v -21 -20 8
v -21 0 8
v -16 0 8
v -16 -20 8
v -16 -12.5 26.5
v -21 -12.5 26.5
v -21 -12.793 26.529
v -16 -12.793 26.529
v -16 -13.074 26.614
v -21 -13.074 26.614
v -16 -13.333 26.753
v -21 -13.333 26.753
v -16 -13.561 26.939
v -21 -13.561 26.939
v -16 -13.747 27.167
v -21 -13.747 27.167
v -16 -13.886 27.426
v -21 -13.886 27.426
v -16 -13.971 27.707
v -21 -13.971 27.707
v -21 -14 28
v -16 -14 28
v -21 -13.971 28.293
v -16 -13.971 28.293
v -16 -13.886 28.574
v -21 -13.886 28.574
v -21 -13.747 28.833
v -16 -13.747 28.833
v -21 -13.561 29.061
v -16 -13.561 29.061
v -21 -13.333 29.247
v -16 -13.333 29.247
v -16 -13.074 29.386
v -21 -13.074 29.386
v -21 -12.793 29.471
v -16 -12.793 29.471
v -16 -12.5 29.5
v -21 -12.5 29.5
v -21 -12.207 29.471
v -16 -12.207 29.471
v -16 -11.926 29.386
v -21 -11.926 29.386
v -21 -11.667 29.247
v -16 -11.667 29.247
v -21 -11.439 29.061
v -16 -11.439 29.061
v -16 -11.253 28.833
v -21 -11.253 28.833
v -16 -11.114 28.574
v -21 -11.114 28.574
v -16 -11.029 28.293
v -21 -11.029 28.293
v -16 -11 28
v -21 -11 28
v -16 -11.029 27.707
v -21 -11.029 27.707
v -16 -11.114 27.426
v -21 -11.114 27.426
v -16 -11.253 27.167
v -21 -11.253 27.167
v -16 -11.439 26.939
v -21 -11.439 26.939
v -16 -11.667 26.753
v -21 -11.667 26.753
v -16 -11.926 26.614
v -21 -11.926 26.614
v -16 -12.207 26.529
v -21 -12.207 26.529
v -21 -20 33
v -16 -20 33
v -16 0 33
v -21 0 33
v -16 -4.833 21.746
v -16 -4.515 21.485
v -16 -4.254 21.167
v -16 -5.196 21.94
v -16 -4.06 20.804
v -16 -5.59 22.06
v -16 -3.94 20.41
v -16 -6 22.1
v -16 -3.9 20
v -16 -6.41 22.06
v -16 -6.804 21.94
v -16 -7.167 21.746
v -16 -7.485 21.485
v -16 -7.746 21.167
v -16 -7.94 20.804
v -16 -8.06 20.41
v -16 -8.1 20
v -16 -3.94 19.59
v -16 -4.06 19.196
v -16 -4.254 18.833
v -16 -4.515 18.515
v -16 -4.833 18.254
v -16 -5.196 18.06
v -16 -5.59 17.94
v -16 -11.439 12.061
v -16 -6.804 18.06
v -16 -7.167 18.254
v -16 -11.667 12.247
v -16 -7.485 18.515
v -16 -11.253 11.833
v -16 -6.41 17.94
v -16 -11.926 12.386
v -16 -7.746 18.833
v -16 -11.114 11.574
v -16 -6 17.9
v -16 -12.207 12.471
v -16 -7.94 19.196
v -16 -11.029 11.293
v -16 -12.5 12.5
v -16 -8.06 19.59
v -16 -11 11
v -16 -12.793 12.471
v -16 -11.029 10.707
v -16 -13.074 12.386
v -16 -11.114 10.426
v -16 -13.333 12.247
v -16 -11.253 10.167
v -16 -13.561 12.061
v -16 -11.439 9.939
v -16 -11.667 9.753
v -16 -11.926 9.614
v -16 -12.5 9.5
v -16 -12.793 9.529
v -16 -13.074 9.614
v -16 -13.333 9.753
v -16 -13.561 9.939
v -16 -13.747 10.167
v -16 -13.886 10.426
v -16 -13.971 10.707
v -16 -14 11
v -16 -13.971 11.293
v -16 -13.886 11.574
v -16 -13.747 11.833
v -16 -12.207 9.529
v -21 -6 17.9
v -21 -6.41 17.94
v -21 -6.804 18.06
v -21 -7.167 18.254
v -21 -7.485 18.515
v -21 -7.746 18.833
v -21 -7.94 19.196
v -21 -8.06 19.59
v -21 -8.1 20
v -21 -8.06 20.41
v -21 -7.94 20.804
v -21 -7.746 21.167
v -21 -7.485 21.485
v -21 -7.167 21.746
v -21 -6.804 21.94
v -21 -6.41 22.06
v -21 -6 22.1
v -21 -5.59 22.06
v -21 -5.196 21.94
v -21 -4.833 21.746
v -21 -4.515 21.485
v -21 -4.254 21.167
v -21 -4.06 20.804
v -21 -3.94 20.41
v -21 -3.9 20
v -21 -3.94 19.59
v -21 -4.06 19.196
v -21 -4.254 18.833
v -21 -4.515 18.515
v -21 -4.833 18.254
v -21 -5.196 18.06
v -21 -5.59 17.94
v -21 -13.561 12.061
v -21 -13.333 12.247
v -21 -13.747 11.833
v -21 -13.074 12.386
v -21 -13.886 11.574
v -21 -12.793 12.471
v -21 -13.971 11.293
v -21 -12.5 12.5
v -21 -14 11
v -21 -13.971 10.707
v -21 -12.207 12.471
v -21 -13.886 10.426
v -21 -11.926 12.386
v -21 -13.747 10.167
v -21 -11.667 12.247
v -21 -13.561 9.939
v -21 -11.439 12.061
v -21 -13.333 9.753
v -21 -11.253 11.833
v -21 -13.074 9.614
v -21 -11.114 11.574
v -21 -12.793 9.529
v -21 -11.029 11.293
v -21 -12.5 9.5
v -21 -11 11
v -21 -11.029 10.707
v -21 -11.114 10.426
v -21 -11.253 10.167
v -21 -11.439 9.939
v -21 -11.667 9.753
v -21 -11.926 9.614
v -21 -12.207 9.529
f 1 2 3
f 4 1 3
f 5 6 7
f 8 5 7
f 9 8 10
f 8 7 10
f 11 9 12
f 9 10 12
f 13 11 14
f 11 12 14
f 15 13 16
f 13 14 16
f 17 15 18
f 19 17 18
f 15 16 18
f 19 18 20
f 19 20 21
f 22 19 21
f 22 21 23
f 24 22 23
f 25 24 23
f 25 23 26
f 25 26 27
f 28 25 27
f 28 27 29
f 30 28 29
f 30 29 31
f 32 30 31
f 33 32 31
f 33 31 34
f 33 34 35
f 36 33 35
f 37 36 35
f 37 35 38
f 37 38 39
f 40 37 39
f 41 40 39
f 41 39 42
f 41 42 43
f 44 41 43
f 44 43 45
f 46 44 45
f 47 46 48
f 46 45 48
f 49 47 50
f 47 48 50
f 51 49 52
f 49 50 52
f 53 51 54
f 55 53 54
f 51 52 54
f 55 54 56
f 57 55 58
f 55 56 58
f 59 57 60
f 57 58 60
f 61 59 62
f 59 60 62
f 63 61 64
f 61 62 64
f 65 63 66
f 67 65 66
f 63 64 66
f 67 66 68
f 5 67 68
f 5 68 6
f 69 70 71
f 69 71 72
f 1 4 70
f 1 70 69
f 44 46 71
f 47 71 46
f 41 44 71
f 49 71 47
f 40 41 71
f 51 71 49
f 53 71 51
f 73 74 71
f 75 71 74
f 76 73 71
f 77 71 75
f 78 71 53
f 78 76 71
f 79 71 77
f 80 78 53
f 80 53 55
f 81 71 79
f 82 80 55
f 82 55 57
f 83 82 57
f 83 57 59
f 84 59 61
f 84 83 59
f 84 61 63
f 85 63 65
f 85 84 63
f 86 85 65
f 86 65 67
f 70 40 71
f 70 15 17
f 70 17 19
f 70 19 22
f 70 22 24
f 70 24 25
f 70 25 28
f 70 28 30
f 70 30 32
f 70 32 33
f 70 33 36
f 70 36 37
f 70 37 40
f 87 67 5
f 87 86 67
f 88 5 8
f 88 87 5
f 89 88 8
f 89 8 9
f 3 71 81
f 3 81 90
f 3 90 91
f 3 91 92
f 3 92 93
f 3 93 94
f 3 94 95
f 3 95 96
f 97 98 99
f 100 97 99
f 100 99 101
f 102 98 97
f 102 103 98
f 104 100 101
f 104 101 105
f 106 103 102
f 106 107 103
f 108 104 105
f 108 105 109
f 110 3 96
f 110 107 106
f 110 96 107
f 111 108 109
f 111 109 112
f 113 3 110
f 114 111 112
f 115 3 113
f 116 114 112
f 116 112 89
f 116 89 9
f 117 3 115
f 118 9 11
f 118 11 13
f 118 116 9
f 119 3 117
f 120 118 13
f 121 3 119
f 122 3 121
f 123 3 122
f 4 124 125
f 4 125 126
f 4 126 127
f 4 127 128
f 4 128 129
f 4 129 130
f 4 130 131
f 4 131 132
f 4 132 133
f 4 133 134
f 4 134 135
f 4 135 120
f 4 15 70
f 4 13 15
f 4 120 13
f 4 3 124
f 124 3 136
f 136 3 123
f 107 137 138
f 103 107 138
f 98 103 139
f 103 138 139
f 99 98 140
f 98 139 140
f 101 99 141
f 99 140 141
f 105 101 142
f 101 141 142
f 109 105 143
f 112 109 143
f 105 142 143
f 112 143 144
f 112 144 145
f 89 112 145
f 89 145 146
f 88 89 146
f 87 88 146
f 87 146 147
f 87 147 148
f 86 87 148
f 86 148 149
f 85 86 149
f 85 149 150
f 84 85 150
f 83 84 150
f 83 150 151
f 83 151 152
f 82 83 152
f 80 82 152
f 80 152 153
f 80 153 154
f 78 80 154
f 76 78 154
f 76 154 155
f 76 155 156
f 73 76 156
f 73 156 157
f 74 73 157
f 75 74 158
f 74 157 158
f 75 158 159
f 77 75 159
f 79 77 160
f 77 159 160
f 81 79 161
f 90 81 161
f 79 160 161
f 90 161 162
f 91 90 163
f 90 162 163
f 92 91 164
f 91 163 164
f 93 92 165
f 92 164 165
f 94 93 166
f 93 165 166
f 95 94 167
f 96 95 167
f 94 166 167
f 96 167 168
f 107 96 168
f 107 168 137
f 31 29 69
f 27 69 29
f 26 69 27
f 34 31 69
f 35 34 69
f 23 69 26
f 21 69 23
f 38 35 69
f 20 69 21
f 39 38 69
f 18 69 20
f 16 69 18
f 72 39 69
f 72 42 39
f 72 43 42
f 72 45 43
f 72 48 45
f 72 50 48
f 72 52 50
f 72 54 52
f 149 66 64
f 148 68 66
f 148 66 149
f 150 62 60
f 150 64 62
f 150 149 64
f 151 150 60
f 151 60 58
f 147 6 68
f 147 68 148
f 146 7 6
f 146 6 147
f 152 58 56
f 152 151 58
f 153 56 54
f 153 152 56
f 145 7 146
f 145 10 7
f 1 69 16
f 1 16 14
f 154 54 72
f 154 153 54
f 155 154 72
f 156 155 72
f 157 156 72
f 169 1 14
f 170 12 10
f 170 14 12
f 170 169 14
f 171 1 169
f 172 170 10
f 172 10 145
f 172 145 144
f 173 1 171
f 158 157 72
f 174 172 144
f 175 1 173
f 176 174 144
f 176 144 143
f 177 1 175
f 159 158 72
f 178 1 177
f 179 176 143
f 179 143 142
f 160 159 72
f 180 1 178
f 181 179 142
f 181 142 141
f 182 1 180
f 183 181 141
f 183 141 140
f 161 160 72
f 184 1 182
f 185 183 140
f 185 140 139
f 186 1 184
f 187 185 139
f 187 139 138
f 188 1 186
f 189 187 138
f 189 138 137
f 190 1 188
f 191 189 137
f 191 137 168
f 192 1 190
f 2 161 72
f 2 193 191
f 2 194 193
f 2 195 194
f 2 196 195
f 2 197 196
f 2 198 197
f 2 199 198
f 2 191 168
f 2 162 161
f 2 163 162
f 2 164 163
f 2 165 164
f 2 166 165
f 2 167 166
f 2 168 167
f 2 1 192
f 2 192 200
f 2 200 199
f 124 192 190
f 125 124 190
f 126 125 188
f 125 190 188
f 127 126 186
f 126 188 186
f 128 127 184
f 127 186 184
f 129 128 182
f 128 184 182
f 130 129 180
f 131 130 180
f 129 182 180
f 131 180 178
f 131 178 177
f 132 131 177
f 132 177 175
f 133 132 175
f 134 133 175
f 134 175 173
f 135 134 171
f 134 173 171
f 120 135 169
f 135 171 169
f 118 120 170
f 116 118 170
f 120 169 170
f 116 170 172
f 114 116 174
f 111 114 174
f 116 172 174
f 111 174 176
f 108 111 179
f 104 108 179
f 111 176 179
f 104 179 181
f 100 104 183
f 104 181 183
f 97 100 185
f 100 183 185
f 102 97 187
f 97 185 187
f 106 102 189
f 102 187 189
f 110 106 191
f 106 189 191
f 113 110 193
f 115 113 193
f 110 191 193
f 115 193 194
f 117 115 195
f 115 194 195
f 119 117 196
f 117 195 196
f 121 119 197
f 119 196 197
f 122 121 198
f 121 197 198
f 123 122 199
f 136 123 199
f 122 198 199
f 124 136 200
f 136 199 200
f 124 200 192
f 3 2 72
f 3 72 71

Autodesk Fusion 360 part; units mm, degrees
sketch "Sketch1" plane through (0, 0, 0) normal (0, 0, 1) x (1, 0, 0)
  line L0 (0, -50) -> (-40, -50)
  line L1 (-40, -50) -> (-40, 0)
  line L2 (-40, 0) -> (0, 0)
  line L3 (0, 0) -> (0, -50)
extrude "Extrude1" add sketch "Sketch1" along normal blind 8
sketch "Sketch2" plane through (0, 0, 8) normal (0, 0, 1) x (-1, 0, 0)
  line L0 (0, 0) -> (40, 0)
  line L1 (40, 0) -> (40, 50)
  line L2 (40, 50) -> (0, 50)
  line L3 (0, 50) -> (0, 0)
  line L4 (21, 0) -> (16, 0)
  line L5 (16, 0) -> (16, 20)
  line L6 (16, 20) -> (21, 20)
  line L7 (21, 20) -> (21, 0)
  dimension "d3" = 5
  dimension "d4" = 20
extrude "Extrude2" add sketch "Sketch2" along normal blind 25 contours L0 L4 L5 L6 L7
hole "Hole1" at (-16, -12.5, 11) direction (-1, 0, 0) diameter 3 depth 6 tip angle 118
hole "Hole2" at (-16, -12.5, 28) direction (-1, 0, 0) diameter 3 depth 6 tip angle 118
hole "Hole3" at (-16, -6, 20) direction (-1, 0, 0) diameter 4.2 depth 6 tip angle 118
extrude "Extrude3" cut 1 faces at (-13.3333, -33.3333, 0) along direction (0, 0, 1) blind 8
